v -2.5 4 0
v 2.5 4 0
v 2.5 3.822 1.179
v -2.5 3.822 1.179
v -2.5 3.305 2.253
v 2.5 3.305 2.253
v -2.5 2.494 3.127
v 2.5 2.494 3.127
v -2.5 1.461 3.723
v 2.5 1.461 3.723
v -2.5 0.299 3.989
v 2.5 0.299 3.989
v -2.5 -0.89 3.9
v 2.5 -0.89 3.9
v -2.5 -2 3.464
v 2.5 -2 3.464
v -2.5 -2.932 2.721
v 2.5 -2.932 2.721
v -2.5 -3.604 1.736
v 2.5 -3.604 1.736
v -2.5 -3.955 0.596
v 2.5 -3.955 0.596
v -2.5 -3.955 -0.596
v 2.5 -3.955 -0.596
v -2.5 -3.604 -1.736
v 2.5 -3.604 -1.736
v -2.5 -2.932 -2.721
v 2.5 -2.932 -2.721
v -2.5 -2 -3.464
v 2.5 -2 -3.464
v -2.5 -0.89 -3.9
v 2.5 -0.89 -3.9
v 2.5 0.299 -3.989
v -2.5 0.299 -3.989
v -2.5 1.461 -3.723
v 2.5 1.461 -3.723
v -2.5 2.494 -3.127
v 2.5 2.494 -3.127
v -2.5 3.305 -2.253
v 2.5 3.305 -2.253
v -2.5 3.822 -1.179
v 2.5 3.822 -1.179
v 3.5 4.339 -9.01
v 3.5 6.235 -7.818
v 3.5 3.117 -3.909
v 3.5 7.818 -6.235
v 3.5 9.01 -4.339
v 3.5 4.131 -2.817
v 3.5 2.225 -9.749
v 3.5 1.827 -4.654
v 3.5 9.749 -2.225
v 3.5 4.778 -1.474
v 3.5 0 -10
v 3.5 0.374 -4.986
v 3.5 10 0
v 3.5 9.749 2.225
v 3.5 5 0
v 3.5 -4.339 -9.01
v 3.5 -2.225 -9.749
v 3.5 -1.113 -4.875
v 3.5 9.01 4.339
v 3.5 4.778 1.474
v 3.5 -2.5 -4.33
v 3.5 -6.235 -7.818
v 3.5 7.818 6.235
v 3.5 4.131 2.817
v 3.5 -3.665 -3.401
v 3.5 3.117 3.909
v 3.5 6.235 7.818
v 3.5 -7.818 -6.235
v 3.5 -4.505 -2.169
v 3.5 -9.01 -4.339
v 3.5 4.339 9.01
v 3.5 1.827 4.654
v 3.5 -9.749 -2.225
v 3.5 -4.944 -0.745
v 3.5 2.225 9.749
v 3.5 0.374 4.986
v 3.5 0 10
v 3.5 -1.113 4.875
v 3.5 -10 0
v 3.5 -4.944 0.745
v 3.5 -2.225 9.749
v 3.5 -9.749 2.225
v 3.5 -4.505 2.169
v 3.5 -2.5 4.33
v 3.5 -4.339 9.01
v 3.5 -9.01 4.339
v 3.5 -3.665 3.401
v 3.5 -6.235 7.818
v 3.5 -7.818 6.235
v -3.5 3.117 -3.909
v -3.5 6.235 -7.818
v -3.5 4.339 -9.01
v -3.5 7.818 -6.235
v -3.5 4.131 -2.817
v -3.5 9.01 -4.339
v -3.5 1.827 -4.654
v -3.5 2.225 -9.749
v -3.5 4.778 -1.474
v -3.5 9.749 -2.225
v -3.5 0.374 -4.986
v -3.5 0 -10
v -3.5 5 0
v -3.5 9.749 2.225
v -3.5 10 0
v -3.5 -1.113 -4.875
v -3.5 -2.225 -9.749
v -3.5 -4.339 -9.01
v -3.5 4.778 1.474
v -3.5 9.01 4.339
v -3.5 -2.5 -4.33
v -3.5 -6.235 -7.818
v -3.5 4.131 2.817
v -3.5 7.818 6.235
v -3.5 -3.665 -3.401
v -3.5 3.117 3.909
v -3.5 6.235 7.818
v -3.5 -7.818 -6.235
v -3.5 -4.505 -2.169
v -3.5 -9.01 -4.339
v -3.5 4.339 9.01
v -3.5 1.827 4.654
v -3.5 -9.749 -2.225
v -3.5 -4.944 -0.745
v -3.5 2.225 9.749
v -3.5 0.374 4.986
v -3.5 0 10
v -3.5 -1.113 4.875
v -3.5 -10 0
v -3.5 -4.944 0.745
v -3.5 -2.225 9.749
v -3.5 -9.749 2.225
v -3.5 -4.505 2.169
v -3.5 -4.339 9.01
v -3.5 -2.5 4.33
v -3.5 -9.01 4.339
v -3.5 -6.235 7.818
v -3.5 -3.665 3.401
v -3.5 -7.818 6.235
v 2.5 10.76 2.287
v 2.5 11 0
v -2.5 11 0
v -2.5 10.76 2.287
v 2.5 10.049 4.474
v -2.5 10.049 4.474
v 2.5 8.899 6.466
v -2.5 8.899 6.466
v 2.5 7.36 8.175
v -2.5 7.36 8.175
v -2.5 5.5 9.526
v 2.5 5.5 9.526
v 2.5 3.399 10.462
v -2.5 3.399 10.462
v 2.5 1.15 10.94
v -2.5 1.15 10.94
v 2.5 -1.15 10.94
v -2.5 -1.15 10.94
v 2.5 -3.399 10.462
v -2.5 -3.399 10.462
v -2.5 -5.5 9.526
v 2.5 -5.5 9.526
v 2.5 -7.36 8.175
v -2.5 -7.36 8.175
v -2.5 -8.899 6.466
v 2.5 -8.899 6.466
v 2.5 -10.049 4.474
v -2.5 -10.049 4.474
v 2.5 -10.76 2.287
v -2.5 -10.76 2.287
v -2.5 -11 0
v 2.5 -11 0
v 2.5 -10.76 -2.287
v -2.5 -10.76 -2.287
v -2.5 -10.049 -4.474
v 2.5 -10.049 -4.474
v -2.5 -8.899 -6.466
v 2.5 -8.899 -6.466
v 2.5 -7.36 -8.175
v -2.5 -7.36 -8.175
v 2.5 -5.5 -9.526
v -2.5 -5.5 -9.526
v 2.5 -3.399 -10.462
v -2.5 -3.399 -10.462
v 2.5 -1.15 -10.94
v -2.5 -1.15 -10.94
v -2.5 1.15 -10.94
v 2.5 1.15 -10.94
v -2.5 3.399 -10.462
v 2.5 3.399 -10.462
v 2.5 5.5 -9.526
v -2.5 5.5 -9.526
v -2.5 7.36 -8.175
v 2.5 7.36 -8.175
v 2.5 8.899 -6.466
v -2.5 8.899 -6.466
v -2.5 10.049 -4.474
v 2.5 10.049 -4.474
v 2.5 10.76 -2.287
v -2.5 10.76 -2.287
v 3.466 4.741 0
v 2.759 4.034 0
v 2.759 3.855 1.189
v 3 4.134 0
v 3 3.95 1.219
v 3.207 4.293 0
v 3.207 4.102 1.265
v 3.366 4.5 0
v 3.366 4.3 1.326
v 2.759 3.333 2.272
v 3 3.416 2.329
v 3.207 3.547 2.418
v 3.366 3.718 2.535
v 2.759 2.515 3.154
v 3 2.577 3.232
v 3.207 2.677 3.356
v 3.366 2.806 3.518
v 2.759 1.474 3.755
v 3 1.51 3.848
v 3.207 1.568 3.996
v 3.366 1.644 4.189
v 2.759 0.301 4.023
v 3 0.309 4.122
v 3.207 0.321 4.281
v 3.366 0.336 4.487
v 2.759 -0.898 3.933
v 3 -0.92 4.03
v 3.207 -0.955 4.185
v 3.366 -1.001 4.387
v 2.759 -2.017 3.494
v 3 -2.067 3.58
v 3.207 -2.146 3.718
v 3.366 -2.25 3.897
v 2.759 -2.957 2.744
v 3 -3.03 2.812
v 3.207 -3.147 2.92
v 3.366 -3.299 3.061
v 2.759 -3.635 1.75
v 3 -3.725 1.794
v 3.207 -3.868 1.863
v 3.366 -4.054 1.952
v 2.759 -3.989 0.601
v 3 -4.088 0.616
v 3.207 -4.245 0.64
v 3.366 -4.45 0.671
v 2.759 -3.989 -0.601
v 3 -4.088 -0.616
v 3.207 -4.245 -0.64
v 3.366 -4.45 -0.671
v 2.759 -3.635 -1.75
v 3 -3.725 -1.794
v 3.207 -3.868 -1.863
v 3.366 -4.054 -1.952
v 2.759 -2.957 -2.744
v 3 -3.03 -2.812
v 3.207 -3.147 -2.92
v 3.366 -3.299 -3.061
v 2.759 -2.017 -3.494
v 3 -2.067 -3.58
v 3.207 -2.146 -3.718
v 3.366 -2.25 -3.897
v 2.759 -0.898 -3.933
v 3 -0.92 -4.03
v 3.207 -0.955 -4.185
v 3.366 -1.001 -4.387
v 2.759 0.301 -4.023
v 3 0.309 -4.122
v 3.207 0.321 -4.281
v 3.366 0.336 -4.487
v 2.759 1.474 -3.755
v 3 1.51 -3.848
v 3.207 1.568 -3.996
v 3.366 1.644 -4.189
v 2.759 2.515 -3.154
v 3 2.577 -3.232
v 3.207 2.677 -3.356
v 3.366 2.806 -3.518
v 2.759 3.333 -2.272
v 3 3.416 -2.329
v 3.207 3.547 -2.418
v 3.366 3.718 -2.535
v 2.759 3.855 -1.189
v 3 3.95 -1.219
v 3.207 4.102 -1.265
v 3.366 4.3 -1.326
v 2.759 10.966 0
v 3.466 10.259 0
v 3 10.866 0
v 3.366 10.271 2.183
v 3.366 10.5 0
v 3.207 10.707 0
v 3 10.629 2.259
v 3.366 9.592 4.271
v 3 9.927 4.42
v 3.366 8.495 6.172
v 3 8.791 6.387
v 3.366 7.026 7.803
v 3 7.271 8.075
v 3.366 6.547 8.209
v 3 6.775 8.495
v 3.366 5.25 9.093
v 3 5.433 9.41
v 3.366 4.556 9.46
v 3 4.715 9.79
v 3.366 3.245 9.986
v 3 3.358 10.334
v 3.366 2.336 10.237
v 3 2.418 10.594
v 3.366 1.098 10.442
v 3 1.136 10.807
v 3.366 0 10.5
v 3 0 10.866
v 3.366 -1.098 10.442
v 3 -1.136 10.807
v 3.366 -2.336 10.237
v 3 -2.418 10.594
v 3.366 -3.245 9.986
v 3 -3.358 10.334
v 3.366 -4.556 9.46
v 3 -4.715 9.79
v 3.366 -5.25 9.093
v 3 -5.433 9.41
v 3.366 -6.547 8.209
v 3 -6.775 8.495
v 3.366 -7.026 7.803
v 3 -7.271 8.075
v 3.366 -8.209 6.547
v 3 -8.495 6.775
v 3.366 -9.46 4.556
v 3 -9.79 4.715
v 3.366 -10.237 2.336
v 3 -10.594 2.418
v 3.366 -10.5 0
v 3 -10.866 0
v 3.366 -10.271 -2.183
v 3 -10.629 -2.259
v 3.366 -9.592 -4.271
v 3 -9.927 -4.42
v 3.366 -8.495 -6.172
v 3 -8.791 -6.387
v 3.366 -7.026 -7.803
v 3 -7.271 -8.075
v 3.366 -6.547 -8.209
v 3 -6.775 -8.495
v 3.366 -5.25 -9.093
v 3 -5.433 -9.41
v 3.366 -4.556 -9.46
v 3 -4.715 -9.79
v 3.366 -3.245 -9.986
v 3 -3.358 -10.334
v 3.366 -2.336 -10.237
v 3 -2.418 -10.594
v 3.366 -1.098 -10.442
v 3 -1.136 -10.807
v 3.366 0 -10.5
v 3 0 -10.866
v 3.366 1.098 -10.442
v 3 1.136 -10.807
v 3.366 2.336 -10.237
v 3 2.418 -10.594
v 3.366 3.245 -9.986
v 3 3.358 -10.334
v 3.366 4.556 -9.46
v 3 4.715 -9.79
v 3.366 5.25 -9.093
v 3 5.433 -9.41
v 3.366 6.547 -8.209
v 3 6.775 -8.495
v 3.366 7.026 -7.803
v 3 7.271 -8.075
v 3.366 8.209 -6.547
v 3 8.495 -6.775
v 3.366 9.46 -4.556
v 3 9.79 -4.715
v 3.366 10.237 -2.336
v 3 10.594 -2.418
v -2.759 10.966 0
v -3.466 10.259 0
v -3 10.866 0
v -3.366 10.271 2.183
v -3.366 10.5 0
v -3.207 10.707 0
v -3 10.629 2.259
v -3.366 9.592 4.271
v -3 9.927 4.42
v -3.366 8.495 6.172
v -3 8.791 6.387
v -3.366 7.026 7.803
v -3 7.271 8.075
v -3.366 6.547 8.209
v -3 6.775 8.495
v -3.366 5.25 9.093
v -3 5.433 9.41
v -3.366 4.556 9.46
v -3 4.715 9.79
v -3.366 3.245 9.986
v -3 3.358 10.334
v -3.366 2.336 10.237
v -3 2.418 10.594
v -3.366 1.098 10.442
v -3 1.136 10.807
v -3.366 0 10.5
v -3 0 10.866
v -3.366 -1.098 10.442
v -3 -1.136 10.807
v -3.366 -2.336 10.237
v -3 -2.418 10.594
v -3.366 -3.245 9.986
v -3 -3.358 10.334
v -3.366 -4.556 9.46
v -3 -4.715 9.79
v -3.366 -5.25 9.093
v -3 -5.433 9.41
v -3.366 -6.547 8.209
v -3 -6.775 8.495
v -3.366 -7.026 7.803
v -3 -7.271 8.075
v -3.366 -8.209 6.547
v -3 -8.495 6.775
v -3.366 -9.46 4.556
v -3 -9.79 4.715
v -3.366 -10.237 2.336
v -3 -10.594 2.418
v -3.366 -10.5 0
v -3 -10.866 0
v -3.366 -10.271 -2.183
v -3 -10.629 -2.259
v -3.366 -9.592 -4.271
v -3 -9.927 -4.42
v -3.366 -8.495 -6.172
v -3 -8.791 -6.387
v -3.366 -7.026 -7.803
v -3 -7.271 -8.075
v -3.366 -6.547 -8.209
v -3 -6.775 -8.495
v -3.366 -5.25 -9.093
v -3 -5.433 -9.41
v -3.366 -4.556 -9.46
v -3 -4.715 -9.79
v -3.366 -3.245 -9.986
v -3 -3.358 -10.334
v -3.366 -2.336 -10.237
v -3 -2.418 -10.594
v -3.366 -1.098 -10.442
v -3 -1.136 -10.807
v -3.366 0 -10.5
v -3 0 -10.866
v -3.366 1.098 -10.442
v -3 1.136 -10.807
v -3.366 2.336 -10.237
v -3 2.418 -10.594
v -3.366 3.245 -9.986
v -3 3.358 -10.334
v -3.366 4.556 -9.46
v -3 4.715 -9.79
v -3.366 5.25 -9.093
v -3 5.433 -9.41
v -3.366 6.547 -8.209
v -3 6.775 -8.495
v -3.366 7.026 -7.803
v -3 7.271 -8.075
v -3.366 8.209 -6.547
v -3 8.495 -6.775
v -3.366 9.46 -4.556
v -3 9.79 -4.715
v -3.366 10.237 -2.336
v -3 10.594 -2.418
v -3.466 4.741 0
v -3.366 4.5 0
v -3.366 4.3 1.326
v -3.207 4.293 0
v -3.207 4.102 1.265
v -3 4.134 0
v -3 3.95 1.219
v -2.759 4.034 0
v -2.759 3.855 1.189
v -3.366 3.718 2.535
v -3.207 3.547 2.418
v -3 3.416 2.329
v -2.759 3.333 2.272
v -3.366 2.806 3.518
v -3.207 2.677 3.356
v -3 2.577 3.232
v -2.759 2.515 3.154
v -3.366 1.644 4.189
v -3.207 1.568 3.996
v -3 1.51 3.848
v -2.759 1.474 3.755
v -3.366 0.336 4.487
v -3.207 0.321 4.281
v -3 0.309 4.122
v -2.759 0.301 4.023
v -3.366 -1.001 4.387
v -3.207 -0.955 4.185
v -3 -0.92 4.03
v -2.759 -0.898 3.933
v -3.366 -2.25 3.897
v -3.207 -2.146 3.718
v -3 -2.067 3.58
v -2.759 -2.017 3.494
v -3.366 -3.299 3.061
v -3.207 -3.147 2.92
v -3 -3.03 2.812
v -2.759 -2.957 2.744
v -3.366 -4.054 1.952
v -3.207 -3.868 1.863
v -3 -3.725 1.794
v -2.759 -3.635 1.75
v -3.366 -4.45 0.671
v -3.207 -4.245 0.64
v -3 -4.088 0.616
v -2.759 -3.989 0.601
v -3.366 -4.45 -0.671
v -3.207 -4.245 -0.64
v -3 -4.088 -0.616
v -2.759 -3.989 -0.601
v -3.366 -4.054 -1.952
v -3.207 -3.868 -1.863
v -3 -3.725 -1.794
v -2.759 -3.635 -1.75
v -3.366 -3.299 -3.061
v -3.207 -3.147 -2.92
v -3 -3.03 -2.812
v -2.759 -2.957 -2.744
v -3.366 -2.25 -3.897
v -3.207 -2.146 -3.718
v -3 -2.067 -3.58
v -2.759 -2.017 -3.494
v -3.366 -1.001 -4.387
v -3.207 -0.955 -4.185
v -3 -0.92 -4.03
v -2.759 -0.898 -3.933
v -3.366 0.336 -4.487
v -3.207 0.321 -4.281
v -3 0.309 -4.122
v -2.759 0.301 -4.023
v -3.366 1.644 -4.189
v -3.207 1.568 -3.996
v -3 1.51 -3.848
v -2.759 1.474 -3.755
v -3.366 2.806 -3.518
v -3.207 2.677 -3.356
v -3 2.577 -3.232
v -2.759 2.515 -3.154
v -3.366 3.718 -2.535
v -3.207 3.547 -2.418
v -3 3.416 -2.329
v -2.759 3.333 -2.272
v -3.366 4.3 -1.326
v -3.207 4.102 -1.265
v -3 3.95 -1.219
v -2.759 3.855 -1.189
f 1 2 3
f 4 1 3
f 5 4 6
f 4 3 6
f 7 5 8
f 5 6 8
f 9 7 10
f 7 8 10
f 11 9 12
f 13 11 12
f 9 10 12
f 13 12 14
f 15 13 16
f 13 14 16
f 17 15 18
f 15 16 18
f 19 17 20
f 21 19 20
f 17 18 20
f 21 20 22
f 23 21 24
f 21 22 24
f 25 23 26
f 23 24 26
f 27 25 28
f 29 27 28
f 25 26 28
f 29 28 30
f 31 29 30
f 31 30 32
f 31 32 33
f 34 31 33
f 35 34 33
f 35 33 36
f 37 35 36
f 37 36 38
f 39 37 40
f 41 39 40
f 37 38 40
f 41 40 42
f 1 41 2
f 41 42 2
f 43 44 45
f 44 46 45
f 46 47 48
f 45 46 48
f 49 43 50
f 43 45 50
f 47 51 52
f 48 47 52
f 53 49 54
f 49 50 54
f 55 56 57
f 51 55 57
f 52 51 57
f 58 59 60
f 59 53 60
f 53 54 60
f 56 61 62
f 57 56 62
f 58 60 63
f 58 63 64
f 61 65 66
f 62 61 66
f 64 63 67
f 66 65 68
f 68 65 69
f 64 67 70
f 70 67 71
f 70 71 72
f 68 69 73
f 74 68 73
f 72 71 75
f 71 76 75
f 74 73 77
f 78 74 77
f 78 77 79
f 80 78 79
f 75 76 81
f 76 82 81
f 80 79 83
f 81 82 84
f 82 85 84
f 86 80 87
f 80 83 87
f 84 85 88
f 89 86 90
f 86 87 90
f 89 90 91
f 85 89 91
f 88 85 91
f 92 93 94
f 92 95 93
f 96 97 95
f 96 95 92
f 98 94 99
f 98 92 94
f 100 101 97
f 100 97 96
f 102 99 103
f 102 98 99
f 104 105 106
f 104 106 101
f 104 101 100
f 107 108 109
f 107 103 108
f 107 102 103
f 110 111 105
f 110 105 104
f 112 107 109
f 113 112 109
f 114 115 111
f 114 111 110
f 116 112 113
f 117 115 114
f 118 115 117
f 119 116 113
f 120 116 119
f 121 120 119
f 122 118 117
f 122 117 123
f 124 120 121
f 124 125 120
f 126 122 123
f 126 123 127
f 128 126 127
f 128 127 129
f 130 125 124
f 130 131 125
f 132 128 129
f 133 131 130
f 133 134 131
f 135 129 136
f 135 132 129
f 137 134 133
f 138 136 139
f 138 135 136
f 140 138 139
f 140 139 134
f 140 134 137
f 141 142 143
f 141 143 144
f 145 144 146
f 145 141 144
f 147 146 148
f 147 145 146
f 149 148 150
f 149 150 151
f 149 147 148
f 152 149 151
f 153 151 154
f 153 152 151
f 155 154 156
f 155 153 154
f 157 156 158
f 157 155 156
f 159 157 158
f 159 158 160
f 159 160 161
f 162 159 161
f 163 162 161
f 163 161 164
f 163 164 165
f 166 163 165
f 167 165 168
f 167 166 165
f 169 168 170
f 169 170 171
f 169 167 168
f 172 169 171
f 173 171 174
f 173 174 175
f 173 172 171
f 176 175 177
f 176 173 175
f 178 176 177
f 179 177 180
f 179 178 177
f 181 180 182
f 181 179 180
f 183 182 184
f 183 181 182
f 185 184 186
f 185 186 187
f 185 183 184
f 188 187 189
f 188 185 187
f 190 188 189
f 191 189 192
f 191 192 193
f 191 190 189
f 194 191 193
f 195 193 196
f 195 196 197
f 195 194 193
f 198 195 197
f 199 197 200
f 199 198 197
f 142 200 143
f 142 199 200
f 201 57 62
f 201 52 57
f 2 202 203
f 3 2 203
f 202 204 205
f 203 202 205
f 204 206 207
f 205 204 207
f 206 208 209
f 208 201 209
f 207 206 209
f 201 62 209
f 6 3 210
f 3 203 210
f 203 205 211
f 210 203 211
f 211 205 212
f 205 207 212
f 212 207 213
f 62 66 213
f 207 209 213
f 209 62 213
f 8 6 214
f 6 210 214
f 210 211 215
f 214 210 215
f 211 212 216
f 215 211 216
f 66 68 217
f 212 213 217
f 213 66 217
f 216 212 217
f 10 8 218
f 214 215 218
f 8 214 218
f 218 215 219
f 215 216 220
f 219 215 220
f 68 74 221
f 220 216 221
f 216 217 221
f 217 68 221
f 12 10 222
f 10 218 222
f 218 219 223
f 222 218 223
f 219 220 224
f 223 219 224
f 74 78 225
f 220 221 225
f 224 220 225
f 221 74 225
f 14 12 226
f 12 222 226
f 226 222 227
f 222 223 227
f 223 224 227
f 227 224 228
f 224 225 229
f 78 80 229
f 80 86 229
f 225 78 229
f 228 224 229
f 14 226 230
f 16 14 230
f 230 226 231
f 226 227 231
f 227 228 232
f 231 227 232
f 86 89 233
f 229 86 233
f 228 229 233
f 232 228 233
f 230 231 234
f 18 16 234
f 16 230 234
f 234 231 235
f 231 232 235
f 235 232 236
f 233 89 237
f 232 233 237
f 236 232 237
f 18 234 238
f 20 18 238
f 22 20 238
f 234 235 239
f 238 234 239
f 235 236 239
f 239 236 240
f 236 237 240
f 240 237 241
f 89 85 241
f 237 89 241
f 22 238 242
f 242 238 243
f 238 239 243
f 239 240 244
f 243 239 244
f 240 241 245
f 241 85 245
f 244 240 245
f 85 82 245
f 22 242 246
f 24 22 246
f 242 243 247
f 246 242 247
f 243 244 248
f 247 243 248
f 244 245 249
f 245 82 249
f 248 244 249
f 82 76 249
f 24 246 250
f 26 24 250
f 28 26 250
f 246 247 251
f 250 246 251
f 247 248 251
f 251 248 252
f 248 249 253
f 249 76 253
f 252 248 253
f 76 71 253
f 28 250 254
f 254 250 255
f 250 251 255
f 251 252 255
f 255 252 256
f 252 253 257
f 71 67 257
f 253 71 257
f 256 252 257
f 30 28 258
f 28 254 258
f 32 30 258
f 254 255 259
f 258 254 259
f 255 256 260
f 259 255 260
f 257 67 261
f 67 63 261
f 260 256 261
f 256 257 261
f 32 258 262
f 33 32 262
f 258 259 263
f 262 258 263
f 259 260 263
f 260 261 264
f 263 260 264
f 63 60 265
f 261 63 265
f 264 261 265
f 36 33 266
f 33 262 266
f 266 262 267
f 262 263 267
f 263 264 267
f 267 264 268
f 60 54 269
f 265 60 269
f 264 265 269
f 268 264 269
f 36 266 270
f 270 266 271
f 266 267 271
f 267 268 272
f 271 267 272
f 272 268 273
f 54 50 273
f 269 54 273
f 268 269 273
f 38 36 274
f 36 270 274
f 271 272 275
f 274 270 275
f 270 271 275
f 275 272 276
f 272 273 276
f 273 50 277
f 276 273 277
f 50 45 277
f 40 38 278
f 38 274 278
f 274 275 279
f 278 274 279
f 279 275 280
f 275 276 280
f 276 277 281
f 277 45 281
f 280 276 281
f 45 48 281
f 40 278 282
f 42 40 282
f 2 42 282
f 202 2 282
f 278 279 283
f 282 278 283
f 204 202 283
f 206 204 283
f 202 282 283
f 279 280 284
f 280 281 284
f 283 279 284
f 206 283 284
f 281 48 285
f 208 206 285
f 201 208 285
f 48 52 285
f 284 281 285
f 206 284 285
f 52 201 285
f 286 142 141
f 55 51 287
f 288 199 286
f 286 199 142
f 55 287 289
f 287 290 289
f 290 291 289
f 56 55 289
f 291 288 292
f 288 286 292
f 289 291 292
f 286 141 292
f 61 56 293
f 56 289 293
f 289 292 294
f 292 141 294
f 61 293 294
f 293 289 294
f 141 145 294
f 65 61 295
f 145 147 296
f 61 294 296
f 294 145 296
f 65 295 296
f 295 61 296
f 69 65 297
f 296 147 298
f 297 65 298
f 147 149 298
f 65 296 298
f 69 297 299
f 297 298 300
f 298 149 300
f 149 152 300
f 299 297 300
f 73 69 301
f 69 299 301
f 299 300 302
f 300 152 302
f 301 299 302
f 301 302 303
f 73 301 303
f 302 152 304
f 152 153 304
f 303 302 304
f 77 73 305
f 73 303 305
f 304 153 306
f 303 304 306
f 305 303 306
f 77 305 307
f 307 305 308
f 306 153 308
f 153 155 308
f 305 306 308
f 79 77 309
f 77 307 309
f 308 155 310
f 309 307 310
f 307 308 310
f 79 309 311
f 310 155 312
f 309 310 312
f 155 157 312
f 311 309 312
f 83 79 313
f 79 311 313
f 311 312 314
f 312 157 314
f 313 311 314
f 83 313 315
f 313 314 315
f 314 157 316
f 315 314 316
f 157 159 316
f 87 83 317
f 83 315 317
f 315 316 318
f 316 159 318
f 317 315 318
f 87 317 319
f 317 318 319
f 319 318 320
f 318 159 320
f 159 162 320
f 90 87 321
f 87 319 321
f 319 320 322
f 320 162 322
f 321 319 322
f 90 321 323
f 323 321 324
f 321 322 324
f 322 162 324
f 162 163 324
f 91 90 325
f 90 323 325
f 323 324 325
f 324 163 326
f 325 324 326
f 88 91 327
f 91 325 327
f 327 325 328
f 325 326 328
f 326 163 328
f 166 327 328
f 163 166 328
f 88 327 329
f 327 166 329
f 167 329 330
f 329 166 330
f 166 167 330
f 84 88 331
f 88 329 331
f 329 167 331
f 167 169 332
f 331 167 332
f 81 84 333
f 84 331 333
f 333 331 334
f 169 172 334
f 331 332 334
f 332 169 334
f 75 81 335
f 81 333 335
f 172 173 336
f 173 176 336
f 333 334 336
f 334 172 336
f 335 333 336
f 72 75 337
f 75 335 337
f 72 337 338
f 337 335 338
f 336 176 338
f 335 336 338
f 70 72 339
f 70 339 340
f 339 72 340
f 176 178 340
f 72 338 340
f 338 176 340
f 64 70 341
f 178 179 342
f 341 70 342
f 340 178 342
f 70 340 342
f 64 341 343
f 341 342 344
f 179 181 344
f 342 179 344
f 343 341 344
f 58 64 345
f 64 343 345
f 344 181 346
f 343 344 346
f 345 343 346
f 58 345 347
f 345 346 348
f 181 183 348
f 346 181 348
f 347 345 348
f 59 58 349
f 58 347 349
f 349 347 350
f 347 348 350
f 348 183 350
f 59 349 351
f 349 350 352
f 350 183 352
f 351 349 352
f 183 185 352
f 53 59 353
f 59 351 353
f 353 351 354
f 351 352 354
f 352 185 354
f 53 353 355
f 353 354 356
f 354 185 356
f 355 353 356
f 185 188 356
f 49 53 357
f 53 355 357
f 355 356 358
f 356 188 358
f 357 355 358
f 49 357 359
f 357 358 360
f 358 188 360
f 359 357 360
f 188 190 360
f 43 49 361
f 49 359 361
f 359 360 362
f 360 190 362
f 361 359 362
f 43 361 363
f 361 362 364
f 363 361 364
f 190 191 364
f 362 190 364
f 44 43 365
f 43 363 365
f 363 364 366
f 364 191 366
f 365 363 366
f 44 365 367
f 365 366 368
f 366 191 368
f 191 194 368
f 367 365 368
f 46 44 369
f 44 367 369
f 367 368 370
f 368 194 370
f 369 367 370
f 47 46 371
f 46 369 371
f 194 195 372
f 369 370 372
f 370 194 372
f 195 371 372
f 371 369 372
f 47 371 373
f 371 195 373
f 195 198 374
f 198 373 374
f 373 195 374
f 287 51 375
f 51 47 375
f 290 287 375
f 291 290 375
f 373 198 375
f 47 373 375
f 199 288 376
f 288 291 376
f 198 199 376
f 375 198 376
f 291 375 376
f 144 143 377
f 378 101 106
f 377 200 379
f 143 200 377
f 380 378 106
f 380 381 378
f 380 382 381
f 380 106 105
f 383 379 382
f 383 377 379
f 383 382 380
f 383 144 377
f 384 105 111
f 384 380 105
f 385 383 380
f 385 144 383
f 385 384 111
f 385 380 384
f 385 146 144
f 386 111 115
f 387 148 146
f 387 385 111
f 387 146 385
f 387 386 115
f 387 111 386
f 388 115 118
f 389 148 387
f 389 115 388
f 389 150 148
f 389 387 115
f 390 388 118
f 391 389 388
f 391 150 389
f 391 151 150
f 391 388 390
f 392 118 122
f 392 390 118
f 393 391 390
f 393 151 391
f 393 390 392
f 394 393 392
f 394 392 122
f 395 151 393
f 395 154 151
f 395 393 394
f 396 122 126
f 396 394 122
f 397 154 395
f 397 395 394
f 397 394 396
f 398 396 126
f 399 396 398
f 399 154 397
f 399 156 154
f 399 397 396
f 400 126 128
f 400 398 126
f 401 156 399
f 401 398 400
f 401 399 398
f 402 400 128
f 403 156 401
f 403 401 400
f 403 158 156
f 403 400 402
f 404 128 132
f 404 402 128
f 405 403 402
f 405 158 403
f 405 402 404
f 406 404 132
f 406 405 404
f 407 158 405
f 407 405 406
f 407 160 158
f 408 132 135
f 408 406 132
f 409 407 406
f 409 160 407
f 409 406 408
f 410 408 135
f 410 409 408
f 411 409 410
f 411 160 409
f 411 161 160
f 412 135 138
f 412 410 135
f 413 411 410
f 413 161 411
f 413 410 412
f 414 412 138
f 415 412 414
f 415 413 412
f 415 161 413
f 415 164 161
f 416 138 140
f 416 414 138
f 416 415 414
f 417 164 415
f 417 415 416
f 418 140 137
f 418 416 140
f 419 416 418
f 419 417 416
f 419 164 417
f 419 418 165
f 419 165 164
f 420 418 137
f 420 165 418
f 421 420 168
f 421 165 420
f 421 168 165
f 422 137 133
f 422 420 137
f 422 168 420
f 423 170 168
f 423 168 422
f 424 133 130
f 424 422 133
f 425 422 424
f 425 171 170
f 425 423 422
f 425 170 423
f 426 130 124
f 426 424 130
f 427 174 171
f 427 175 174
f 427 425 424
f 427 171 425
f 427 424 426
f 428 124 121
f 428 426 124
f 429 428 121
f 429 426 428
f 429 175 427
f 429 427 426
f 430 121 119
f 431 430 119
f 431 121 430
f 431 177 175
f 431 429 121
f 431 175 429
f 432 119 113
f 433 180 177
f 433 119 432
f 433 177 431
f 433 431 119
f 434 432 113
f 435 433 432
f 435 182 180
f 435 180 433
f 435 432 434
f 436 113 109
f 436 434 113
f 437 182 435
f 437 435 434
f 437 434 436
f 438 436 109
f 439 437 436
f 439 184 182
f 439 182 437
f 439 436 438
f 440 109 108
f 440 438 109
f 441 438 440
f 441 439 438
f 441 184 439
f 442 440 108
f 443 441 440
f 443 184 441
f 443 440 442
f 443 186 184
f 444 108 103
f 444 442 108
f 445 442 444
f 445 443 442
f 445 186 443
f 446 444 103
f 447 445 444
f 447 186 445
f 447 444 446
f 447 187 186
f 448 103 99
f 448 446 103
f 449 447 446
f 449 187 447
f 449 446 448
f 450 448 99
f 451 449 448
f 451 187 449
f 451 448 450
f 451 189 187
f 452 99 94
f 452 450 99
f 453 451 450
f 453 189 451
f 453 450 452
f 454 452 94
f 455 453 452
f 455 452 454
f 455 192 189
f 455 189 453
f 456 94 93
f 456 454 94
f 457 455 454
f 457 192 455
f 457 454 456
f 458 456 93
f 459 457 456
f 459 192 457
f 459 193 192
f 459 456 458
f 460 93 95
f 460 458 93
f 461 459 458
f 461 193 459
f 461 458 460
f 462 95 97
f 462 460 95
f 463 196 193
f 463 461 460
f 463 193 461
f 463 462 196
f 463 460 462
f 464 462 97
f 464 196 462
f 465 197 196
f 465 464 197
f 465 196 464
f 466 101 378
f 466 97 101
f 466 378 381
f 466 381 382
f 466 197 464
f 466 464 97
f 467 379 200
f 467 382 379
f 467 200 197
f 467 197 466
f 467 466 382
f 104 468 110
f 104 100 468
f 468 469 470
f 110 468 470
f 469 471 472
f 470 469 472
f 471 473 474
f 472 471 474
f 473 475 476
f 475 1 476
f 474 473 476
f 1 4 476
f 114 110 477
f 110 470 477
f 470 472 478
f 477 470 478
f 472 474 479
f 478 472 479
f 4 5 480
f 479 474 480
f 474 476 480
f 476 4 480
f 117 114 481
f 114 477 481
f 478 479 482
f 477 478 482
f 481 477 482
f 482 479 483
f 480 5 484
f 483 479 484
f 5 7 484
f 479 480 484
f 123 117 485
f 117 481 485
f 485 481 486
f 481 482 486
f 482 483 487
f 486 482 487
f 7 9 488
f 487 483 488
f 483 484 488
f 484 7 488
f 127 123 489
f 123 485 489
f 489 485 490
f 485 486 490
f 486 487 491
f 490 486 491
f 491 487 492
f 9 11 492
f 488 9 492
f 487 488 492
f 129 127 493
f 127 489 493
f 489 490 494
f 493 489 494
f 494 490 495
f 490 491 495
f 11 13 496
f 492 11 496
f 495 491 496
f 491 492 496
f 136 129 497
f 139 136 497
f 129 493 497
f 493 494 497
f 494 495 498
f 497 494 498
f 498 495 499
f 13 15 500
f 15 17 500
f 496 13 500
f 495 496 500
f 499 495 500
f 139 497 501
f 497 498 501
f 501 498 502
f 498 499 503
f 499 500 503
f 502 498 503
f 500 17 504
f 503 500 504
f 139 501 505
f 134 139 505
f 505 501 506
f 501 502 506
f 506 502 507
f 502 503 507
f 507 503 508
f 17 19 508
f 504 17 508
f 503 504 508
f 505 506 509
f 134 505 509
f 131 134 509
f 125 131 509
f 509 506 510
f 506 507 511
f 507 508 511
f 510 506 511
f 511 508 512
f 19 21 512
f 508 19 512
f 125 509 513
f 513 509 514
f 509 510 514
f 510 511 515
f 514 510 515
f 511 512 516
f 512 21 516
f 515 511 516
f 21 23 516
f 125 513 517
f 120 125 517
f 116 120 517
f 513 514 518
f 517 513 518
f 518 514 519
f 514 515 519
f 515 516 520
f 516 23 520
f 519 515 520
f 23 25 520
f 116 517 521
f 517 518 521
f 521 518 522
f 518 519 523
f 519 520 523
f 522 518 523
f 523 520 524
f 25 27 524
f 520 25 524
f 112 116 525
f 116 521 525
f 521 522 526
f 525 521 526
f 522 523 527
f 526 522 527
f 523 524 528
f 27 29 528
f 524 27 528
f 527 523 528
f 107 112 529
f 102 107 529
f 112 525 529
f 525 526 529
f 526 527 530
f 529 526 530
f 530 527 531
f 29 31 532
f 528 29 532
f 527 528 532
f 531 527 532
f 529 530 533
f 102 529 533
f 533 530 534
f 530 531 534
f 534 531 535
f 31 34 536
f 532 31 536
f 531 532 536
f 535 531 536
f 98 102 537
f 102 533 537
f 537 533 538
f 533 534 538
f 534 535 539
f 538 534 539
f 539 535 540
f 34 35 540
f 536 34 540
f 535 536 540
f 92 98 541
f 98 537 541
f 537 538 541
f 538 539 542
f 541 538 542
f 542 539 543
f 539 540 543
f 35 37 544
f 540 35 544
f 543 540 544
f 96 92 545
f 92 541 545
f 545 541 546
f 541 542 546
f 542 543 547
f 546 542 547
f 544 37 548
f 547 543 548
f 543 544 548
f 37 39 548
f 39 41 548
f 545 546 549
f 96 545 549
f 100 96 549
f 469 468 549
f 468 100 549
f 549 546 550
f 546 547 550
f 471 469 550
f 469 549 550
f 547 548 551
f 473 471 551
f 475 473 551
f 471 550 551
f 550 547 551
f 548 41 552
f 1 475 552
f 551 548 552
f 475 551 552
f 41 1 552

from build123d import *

# Parameters (mm, degrees)
SKETCH1_W = 7
SKETCH1_H = 7
FILLET1_R = 1


with BuildPart() as part:
    # Sketch1 → Revolve1 (revolve)
    with BuildSketch(Plane.XY):
        with Locations((0, 7.5)):
            Rectangle(SKETCH1_W, SKETCH1_H)
    revolve(axis=Axis((0, 0, 0), (1, 0, 0)))

    # Fillet1
    fillet1_edges = [part.edges().sort_by_distance(p)[0] for p in [
        (-3.5, -4, 0),
        (3.5, -4, 0),
        (3.5, -11, 0),
        (-3.5, -11, 0),
    ]]
    fillet(fillet1_edges, radius=FILLET1_R)


solid = part.part
